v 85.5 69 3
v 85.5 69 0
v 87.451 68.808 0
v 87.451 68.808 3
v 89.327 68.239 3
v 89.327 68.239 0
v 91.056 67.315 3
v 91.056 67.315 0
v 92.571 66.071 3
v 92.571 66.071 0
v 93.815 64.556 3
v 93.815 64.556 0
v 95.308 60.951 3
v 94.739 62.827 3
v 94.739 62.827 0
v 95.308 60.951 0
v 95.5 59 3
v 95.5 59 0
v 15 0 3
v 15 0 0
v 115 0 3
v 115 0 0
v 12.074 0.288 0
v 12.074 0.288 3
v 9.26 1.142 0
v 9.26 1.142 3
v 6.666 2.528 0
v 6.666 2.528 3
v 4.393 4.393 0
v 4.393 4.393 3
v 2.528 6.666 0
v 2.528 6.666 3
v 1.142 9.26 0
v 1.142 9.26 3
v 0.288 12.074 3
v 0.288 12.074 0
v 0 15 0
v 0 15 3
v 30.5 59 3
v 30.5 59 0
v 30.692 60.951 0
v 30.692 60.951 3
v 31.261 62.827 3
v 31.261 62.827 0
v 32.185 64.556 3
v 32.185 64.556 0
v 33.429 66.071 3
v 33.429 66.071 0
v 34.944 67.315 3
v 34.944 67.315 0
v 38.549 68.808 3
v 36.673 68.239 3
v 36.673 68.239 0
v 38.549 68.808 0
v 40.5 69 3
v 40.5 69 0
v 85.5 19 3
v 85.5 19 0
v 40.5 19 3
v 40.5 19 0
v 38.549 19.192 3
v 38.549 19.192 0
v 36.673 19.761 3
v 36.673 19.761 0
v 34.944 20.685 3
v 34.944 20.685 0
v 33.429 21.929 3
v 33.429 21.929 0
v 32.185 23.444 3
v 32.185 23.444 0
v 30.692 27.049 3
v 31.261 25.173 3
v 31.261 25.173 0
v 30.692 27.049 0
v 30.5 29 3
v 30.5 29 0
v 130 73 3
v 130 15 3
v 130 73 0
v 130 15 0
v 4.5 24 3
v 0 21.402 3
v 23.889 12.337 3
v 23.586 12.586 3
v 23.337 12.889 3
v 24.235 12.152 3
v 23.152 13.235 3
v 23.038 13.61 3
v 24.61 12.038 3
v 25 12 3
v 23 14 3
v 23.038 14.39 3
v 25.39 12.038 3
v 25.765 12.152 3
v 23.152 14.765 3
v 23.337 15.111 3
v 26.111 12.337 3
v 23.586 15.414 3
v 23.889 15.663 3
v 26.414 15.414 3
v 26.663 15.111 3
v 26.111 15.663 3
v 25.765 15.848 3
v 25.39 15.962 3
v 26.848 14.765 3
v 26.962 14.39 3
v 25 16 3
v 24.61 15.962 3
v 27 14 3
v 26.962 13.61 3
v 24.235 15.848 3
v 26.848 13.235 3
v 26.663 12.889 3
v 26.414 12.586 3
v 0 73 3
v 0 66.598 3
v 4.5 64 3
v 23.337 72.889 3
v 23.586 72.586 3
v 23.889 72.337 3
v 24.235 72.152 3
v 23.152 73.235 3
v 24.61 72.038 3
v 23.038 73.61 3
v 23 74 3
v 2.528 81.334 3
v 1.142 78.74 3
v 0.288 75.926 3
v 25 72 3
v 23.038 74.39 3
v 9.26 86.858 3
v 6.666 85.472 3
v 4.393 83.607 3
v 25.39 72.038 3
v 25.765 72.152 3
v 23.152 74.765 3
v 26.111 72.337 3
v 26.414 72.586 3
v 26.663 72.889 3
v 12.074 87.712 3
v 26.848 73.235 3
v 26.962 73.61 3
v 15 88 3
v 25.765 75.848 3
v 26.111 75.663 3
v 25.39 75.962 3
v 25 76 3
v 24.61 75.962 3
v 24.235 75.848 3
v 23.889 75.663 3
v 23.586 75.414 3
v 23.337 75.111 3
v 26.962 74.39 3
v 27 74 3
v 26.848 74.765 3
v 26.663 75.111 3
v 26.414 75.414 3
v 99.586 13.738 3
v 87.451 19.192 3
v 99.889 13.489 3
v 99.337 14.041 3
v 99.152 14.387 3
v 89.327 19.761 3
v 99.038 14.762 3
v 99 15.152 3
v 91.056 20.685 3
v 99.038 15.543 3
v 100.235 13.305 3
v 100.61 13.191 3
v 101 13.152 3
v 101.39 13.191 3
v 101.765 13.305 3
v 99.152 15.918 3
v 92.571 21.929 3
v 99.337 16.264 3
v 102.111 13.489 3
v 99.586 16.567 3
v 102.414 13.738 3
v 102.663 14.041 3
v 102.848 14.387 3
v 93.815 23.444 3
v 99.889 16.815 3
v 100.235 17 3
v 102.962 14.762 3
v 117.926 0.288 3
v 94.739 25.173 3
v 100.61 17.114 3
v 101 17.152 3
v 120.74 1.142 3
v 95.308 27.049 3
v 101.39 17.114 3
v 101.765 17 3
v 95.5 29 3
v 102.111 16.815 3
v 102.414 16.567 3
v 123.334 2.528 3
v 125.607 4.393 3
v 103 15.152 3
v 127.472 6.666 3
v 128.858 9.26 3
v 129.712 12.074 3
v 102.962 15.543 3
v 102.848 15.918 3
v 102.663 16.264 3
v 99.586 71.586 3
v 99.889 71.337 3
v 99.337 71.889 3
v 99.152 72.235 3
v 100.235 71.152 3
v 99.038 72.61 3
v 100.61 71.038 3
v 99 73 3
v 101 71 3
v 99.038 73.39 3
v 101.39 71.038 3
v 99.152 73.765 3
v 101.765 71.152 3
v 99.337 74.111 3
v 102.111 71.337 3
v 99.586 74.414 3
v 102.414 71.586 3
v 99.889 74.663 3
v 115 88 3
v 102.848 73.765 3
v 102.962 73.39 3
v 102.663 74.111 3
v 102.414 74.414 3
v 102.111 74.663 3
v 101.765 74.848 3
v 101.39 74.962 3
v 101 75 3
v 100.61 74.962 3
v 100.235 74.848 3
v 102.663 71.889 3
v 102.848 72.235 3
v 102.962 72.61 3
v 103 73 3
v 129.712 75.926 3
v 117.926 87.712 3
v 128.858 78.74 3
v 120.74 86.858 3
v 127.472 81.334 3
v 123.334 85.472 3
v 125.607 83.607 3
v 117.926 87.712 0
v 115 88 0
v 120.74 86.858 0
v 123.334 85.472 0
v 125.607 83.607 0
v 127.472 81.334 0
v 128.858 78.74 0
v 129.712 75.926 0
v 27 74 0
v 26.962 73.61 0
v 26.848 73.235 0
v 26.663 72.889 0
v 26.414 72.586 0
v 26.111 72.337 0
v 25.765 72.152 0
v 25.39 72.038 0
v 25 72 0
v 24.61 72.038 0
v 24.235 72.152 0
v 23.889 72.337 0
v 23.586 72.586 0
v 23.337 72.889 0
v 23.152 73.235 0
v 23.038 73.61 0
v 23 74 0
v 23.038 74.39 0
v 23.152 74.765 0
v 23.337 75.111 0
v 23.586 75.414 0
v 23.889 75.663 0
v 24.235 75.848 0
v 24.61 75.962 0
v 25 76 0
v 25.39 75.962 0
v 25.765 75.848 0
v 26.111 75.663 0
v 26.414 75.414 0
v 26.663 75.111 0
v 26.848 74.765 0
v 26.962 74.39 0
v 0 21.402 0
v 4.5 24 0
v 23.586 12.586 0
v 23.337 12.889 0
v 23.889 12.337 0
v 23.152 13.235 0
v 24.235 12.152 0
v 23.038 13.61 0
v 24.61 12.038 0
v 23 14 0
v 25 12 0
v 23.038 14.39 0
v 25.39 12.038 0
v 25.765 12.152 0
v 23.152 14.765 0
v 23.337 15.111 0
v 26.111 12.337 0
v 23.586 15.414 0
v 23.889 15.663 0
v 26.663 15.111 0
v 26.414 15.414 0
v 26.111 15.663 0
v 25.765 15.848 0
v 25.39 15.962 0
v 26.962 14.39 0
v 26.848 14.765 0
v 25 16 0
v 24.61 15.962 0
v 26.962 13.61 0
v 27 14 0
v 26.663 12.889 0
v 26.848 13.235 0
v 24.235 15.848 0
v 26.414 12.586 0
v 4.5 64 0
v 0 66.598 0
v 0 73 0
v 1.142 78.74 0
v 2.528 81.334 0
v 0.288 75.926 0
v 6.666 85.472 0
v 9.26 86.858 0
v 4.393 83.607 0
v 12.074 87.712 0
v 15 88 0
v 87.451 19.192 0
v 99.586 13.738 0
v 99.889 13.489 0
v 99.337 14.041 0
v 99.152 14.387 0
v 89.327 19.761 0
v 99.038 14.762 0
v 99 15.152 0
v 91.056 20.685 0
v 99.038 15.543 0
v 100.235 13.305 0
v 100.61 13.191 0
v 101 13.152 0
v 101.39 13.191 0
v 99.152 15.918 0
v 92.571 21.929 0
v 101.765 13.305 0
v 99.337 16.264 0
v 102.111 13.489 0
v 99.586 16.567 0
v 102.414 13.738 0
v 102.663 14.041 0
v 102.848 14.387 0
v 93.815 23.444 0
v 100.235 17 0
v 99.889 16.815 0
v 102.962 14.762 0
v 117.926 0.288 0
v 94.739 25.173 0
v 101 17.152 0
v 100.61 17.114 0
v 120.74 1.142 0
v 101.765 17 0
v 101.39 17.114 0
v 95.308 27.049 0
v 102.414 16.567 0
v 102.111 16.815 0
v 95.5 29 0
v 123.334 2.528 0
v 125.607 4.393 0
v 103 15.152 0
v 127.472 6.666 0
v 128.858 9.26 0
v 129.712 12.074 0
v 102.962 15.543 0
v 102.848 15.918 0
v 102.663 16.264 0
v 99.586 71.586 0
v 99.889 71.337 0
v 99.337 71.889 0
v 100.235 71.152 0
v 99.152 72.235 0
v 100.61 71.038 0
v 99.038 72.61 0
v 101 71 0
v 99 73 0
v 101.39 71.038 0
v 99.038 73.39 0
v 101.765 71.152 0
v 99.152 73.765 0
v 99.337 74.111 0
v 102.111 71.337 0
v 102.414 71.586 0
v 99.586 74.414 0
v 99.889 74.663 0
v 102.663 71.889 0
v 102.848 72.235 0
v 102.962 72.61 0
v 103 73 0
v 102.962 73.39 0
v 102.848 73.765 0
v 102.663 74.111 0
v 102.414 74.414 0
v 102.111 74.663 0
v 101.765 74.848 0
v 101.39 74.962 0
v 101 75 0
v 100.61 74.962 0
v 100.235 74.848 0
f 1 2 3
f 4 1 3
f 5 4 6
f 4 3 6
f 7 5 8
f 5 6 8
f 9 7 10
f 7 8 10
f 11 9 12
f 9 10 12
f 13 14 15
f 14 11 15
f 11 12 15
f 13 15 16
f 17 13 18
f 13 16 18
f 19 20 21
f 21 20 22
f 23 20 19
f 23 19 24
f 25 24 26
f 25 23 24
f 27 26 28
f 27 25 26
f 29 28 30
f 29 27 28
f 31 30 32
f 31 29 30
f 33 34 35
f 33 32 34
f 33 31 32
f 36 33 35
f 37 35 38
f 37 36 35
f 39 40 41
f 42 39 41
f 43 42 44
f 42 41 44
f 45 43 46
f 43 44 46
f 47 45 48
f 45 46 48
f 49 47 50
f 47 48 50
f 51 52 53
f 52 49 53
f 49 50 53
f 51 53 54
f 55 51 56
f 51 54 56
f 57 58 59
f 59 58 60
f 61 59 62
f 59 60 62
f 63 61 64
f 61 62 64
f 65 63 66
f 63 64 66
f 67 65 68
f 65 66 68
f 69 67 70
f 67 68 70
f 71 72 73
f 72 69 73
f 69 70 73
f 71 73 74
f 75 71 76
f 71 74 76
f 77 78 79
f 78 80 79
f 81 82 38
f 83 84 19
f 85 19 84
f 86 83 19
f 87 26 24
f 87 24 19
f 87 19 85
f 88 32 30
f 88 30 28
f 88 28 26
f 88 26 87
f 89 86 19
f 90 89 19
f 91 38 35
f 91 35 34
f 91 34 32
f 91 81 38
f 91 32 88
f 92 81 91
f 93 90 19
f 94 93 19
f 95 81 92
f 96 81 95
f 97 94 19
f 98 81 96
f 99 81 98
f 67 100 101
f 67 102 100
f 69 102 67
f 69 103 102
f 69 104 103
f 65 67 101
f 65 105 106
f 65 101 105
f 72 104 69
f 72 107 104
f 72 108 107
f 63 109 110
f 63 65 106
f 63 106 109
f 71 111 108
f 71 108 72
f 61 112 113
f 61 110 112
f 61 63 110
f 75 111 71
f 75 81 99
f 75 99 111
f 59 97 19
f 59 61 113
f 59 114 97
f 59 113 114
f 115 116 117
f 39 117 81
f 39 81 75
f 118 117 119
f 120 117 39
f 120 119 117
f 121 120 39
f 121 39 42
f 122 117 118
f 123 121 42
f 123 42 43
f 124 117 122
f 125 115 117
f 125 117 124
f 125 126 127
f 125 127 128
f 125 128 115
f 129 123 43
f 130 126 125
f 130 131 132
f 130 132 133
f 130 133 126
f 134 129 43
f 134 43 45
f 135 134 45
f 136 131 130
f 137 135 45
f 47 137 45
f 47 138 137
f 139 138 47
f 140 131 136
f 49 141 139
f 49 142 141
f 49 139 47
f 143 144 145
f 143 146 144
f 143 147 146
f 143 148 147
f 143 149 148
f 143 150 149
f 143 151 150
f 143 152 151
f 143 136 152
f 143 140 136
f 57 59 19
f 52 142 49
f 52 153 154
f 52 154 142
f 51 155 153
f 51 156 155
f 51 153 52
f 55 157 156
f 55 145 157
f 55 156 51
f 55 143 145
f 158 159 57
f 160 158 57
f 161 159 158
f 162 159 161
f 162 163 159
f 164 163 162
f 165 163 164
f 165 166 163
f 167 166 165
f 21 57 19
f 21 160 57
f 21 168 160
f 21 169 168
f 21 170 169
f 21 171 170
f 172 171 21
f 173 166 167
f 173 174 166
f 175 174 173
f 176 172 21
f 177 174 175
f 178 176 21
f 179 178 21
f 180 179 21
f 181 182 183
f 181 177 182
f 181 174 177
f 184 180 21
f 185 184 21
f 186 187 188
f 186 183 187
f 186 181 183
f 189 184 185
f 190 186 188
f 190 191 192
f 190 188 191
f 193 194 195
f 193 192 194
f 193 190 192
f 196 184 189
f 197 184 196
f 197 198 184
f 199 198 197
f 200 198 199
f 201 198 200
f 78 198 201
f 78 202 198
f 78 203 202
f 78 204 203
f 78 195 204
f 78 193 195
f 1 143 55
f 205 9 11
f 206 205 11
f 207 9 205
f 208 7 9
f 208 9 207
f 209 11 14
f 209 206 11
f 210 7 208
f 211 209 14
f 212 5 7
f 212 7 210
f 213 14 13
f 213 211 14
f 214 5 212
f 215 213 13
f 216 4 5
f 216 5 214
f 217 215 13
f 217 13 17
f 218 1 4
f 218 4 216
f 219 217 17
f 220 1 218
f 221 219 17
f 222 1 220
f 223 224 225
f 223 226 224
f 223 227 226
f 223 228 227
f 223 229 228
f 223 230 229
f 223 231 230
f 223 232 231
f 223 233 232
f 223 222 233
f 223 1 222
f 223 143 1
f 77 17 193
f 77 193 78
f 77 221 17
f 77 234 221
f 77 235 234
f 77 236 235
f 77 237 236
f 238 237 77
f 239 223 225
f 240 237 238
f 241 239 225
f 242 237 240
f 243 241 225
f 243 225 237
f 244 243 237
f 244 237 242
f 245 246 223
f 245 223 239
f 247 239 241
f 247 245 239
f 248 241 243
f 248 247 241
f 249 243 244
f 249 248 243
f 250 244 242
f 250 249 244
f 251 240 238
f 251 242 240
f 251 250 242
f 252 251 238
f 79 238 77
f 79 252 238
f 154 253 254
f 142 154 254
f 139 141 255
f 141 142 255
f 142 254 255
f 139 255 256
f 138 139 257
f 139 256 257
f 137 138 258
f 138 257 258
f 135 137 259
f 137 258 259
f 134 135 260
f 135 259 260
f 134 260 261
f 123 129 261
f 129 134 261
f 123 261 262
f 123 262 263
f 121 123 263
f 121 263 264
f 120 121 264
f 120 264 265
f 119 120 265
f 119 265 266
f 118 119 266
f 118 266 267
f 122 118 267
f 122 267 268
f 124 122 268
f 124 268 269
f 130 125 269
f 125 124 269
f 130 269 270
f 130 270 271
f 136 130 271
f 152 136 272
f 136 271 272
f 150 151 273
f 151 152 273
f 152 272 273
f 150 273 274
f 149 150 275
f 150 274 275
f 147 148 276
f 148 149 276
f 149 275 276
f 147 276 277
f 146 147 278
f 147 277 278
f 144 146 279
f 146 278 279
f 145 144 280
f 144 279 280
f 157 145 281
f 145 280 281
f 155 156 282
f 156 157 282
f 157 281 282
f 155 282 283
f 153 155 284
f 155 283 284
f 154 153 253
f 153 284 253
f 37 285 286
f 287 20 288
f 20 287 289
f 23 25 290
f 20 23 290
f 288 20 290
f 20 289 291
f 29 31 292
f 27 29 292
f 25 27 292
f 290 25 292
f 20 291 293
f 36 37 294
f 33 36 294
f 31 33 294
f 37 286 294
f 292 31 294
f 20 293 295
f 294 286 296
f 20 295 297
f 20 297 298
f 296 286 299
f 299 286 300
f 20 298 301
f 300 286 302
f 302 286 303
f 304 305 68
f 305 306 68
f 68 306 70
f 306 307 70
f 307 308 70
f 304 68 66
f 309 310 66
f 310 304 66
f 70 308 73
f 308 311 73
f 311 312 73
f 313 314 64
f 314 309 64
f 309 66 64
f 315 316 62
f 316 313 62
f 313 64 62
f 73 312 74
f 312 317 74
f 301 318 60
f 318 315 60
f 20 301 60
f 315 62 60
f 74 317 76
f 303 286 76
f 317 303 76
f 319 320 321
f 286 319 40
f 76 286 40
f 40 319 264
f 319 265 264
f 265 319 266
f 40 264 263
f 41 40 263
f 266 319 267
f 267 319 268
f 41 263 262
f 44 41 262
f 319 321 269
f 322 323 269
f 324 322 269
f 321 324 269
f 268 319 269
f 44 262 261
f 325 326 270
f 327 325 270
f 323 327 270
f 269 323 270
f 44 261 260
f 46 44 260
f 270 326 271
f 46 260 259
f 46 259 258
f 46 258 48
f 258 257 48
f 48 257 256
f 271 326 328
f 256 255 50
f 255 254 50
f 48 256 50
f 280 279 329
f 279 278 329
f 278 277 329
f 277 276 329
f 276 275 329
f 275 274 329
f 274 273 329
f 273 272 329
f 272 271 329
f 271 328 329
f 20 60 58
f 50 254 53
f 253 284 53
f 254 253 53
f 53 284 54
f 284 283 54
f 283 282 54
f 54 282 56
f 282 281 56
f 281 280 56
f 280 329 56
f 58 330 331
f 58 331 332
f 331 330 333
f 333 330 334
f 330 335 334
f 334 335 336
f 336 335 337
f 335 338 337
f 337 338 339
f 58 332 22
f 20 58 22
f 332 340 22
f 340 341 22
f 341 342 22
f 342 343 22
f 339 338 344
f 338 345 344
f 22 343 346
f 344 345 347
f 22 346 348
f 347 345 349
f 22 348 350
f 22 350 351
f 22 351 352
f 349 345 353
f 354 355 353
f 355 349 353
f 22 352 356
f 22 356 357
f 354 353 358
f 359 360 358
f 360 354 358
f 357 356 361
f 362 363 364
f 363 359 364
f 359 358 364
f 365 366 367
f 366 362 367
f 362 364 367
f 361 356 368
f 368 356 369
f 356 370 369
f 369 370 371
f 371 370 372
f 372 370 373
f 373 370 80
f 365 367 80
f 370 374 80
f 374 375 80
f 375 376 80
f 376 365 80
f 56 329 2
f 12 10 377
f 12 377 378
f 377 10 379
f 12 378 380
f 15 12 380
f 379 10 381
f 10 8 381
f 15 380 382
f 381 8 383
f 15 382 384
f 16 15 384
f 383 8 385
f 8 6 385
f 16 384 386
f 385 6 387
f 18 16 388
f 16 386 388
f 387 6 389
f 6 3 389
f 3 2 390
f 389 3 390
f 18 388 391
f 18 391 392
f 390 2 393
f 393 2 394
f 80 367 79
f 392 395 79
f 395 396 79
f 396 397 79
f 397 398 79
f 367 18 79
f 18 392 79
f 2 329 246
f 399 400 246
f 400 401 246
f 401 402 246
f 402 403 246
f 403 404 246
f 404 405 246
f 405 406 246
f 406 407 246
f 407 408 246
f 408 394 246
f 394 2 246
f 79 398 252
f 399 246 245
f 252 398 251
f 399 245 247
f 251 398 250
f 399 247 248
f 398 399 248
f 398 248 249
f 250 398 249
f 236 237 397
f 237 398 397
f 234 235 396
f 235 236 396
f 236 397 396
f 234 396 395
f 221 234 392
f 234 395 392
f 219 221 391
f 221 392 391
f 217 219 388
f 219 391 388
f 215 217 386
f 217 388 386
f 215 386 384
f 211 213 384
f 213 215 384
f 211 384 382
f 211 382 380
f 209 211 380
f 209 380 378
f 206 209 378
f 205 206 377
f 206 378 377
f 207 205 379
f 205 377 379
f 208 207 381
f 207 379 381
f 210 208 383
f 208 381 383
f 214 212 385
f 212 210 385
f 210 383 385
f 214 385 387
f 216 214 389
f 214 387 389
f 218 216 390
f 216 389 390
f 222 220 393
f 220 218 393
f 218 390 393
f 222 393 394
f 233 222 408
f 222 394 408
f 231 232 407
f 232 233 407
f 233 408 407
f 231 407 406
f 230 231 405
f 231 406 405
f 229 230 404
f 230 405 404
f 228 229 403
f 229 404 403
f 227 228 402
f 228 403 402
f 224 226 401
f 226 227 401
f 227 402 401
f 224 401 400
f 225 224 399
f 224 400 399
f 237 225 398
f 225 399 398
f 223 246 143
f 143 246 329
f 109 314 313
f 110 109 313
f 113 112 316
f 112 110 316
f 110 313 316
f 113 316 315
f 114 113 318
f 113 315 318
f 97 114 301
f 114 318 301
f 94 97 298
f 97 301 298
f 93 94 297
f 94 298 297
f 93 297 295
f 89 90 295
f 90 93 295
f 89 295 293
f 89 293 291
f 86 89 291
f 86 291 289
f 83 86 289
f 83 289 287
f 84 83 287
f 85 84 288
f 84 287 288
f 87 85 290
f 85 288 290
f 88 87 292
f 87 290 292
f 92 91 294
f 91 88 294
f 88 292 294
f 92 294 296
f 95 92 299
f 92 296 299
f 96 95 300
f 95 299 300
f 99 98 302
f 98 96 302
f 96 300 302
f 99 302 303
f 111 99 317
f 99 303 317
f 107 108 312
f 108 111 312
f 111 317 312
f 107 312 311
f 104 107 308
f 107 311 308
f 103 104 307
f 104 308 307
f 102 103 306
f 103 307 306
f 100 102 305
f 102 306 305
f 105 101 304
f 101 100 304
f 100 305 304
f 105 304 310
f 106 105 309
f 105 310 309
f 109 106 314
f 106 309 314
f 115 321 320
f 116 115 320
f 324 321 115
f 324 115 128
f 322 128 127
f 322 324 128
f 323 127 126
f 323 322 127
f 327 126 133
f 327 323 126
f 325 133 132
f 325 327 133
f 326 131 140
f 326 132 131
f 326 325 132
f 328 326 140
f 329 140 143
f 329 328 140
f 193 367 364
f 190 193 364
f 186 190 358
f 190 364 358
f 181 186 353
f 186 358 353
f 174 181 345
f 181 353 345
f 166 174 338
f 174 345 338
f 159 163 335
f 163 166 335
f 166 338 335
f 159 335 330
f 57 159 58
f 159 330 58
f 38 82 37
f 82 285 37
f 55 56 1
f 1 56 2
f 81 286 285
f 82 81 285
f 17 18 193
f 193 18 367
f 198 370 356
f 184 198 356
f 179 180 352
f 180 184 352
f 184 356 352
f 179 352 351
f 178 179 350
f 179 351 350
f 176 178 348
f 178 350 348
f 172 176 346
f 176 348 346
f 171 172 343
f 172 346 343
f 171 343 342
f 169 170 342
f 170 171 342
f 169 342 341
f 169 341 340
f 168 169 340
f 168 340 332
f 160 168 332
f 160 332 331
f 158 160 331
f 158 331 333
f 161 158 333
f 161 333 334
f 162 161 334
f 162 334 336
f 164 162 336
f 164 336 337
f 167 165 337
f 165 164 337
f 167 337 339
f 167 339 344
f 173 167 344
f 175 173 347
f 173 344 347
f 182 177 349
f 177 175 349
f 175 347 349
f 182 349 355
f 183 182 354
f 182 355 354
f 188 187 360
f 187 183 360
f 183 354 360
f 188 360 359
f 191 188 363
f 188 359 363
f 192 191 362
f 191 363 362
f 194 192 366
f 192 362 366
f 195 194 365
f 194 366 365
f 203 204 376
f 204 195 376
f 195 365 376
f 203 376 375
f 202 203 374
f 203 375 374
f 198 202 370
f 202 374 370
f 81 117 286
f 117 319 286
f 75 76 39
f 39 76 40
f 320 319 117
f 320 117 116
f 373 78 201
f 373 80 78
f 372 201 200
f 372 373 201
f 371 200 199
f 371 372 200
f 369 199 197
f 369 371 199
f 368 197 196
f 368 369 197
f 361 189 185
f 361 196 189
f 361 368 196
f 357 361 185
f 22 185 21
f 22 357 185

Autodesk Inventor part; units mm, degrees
ref_plane "YZ Plane" through (0, 0, 0) normal (1, 0, 0) x (0, 1, 0)
ref_plane "XZ Plane" through (0, 0, 0) normal (0, 1, 0) x (-1, 0, 0)
ref_plane "XY Plane" through (0, 0, 0) normal (0, 0, 1) x (1, 0, 0)
sketch "Náčrt1" plane through (0, 0, 0) normal (0, 0, 1) x (1, 0, 0)
  line L0 (15, 0) -> (115, 0)
  line L1 (130, 15) -> (130, 73)
  line L2 (115, 88) -> (15, 88)
  line L3 (40.5, 69) -> (85.5, 69)
  line L4 (95.5, 59) -> (95.5, 29)
  line L5 (85.5, 19) -> (40.5, 19)
  line L6 (30.5, 29) -> (30.5, 59)
  arc A0 (40.5, 69) -> (30.5, 59) centre (40.5, 59) ccw
  arc A1 (95.5, 59) -> (85.5, 69) centre (85.5, 59) ccw
  arc A2 (85.5, 19) -> (95.5, 29) centre (85.5, 29) ccw
  arc A3 (30.5, 29) -> (40.5, 19) centre (40.5, 29) ccw
  arc A4 (130, 73) -> (115, 88) centre (115, 73) ccw
  arc A5 (115, 0) -> (130, 15) centre (115, 15) ccw
  arc A6 (15, 88) -> (0, 73) centre (15, 73) ccw
  arc A7 (0, 15) -> (15, 0) centre (15, 15) ccw
  circle A8 centre (25, 74) radius 2
  circle A9 centre (25, 14) radius 2
  circle A10 centre (101, 73) radius 2
  circle A11 centre (101, 15.1524) radius 2
  line L7 (4.5, 64) -> (4.5, 24)
  line L8 (4.5, 64) -> (0, 66.5981)
  line L9 (4.5, 24) -> (0, 21.4019)
  line L10 (0, 73) -> (0, 66.5981)
  line L11 (0, 21.4019) -> (0, 15)
  point P0 (0, 0)
  point P1 (30.5, 69)
  point P2 (95.5, 69)
  point P3 (30.5, 19)
  dimension "d0" = 65
  dimension "d1" = 50
  dimension "d7" = 34.5
  dimension "d9" = 88
  dimension "d10" = 19
  dimension "d16" = 76
  dimension "d18" = 60
  dimension "d19" = 14
  dimension "d23" = 105
  dimension "d24" = 0
extrude "Vysunutí1" add sketch "Náčrt1" along normal blind 3
properties part number "WarBRD_Upper_Plate"
